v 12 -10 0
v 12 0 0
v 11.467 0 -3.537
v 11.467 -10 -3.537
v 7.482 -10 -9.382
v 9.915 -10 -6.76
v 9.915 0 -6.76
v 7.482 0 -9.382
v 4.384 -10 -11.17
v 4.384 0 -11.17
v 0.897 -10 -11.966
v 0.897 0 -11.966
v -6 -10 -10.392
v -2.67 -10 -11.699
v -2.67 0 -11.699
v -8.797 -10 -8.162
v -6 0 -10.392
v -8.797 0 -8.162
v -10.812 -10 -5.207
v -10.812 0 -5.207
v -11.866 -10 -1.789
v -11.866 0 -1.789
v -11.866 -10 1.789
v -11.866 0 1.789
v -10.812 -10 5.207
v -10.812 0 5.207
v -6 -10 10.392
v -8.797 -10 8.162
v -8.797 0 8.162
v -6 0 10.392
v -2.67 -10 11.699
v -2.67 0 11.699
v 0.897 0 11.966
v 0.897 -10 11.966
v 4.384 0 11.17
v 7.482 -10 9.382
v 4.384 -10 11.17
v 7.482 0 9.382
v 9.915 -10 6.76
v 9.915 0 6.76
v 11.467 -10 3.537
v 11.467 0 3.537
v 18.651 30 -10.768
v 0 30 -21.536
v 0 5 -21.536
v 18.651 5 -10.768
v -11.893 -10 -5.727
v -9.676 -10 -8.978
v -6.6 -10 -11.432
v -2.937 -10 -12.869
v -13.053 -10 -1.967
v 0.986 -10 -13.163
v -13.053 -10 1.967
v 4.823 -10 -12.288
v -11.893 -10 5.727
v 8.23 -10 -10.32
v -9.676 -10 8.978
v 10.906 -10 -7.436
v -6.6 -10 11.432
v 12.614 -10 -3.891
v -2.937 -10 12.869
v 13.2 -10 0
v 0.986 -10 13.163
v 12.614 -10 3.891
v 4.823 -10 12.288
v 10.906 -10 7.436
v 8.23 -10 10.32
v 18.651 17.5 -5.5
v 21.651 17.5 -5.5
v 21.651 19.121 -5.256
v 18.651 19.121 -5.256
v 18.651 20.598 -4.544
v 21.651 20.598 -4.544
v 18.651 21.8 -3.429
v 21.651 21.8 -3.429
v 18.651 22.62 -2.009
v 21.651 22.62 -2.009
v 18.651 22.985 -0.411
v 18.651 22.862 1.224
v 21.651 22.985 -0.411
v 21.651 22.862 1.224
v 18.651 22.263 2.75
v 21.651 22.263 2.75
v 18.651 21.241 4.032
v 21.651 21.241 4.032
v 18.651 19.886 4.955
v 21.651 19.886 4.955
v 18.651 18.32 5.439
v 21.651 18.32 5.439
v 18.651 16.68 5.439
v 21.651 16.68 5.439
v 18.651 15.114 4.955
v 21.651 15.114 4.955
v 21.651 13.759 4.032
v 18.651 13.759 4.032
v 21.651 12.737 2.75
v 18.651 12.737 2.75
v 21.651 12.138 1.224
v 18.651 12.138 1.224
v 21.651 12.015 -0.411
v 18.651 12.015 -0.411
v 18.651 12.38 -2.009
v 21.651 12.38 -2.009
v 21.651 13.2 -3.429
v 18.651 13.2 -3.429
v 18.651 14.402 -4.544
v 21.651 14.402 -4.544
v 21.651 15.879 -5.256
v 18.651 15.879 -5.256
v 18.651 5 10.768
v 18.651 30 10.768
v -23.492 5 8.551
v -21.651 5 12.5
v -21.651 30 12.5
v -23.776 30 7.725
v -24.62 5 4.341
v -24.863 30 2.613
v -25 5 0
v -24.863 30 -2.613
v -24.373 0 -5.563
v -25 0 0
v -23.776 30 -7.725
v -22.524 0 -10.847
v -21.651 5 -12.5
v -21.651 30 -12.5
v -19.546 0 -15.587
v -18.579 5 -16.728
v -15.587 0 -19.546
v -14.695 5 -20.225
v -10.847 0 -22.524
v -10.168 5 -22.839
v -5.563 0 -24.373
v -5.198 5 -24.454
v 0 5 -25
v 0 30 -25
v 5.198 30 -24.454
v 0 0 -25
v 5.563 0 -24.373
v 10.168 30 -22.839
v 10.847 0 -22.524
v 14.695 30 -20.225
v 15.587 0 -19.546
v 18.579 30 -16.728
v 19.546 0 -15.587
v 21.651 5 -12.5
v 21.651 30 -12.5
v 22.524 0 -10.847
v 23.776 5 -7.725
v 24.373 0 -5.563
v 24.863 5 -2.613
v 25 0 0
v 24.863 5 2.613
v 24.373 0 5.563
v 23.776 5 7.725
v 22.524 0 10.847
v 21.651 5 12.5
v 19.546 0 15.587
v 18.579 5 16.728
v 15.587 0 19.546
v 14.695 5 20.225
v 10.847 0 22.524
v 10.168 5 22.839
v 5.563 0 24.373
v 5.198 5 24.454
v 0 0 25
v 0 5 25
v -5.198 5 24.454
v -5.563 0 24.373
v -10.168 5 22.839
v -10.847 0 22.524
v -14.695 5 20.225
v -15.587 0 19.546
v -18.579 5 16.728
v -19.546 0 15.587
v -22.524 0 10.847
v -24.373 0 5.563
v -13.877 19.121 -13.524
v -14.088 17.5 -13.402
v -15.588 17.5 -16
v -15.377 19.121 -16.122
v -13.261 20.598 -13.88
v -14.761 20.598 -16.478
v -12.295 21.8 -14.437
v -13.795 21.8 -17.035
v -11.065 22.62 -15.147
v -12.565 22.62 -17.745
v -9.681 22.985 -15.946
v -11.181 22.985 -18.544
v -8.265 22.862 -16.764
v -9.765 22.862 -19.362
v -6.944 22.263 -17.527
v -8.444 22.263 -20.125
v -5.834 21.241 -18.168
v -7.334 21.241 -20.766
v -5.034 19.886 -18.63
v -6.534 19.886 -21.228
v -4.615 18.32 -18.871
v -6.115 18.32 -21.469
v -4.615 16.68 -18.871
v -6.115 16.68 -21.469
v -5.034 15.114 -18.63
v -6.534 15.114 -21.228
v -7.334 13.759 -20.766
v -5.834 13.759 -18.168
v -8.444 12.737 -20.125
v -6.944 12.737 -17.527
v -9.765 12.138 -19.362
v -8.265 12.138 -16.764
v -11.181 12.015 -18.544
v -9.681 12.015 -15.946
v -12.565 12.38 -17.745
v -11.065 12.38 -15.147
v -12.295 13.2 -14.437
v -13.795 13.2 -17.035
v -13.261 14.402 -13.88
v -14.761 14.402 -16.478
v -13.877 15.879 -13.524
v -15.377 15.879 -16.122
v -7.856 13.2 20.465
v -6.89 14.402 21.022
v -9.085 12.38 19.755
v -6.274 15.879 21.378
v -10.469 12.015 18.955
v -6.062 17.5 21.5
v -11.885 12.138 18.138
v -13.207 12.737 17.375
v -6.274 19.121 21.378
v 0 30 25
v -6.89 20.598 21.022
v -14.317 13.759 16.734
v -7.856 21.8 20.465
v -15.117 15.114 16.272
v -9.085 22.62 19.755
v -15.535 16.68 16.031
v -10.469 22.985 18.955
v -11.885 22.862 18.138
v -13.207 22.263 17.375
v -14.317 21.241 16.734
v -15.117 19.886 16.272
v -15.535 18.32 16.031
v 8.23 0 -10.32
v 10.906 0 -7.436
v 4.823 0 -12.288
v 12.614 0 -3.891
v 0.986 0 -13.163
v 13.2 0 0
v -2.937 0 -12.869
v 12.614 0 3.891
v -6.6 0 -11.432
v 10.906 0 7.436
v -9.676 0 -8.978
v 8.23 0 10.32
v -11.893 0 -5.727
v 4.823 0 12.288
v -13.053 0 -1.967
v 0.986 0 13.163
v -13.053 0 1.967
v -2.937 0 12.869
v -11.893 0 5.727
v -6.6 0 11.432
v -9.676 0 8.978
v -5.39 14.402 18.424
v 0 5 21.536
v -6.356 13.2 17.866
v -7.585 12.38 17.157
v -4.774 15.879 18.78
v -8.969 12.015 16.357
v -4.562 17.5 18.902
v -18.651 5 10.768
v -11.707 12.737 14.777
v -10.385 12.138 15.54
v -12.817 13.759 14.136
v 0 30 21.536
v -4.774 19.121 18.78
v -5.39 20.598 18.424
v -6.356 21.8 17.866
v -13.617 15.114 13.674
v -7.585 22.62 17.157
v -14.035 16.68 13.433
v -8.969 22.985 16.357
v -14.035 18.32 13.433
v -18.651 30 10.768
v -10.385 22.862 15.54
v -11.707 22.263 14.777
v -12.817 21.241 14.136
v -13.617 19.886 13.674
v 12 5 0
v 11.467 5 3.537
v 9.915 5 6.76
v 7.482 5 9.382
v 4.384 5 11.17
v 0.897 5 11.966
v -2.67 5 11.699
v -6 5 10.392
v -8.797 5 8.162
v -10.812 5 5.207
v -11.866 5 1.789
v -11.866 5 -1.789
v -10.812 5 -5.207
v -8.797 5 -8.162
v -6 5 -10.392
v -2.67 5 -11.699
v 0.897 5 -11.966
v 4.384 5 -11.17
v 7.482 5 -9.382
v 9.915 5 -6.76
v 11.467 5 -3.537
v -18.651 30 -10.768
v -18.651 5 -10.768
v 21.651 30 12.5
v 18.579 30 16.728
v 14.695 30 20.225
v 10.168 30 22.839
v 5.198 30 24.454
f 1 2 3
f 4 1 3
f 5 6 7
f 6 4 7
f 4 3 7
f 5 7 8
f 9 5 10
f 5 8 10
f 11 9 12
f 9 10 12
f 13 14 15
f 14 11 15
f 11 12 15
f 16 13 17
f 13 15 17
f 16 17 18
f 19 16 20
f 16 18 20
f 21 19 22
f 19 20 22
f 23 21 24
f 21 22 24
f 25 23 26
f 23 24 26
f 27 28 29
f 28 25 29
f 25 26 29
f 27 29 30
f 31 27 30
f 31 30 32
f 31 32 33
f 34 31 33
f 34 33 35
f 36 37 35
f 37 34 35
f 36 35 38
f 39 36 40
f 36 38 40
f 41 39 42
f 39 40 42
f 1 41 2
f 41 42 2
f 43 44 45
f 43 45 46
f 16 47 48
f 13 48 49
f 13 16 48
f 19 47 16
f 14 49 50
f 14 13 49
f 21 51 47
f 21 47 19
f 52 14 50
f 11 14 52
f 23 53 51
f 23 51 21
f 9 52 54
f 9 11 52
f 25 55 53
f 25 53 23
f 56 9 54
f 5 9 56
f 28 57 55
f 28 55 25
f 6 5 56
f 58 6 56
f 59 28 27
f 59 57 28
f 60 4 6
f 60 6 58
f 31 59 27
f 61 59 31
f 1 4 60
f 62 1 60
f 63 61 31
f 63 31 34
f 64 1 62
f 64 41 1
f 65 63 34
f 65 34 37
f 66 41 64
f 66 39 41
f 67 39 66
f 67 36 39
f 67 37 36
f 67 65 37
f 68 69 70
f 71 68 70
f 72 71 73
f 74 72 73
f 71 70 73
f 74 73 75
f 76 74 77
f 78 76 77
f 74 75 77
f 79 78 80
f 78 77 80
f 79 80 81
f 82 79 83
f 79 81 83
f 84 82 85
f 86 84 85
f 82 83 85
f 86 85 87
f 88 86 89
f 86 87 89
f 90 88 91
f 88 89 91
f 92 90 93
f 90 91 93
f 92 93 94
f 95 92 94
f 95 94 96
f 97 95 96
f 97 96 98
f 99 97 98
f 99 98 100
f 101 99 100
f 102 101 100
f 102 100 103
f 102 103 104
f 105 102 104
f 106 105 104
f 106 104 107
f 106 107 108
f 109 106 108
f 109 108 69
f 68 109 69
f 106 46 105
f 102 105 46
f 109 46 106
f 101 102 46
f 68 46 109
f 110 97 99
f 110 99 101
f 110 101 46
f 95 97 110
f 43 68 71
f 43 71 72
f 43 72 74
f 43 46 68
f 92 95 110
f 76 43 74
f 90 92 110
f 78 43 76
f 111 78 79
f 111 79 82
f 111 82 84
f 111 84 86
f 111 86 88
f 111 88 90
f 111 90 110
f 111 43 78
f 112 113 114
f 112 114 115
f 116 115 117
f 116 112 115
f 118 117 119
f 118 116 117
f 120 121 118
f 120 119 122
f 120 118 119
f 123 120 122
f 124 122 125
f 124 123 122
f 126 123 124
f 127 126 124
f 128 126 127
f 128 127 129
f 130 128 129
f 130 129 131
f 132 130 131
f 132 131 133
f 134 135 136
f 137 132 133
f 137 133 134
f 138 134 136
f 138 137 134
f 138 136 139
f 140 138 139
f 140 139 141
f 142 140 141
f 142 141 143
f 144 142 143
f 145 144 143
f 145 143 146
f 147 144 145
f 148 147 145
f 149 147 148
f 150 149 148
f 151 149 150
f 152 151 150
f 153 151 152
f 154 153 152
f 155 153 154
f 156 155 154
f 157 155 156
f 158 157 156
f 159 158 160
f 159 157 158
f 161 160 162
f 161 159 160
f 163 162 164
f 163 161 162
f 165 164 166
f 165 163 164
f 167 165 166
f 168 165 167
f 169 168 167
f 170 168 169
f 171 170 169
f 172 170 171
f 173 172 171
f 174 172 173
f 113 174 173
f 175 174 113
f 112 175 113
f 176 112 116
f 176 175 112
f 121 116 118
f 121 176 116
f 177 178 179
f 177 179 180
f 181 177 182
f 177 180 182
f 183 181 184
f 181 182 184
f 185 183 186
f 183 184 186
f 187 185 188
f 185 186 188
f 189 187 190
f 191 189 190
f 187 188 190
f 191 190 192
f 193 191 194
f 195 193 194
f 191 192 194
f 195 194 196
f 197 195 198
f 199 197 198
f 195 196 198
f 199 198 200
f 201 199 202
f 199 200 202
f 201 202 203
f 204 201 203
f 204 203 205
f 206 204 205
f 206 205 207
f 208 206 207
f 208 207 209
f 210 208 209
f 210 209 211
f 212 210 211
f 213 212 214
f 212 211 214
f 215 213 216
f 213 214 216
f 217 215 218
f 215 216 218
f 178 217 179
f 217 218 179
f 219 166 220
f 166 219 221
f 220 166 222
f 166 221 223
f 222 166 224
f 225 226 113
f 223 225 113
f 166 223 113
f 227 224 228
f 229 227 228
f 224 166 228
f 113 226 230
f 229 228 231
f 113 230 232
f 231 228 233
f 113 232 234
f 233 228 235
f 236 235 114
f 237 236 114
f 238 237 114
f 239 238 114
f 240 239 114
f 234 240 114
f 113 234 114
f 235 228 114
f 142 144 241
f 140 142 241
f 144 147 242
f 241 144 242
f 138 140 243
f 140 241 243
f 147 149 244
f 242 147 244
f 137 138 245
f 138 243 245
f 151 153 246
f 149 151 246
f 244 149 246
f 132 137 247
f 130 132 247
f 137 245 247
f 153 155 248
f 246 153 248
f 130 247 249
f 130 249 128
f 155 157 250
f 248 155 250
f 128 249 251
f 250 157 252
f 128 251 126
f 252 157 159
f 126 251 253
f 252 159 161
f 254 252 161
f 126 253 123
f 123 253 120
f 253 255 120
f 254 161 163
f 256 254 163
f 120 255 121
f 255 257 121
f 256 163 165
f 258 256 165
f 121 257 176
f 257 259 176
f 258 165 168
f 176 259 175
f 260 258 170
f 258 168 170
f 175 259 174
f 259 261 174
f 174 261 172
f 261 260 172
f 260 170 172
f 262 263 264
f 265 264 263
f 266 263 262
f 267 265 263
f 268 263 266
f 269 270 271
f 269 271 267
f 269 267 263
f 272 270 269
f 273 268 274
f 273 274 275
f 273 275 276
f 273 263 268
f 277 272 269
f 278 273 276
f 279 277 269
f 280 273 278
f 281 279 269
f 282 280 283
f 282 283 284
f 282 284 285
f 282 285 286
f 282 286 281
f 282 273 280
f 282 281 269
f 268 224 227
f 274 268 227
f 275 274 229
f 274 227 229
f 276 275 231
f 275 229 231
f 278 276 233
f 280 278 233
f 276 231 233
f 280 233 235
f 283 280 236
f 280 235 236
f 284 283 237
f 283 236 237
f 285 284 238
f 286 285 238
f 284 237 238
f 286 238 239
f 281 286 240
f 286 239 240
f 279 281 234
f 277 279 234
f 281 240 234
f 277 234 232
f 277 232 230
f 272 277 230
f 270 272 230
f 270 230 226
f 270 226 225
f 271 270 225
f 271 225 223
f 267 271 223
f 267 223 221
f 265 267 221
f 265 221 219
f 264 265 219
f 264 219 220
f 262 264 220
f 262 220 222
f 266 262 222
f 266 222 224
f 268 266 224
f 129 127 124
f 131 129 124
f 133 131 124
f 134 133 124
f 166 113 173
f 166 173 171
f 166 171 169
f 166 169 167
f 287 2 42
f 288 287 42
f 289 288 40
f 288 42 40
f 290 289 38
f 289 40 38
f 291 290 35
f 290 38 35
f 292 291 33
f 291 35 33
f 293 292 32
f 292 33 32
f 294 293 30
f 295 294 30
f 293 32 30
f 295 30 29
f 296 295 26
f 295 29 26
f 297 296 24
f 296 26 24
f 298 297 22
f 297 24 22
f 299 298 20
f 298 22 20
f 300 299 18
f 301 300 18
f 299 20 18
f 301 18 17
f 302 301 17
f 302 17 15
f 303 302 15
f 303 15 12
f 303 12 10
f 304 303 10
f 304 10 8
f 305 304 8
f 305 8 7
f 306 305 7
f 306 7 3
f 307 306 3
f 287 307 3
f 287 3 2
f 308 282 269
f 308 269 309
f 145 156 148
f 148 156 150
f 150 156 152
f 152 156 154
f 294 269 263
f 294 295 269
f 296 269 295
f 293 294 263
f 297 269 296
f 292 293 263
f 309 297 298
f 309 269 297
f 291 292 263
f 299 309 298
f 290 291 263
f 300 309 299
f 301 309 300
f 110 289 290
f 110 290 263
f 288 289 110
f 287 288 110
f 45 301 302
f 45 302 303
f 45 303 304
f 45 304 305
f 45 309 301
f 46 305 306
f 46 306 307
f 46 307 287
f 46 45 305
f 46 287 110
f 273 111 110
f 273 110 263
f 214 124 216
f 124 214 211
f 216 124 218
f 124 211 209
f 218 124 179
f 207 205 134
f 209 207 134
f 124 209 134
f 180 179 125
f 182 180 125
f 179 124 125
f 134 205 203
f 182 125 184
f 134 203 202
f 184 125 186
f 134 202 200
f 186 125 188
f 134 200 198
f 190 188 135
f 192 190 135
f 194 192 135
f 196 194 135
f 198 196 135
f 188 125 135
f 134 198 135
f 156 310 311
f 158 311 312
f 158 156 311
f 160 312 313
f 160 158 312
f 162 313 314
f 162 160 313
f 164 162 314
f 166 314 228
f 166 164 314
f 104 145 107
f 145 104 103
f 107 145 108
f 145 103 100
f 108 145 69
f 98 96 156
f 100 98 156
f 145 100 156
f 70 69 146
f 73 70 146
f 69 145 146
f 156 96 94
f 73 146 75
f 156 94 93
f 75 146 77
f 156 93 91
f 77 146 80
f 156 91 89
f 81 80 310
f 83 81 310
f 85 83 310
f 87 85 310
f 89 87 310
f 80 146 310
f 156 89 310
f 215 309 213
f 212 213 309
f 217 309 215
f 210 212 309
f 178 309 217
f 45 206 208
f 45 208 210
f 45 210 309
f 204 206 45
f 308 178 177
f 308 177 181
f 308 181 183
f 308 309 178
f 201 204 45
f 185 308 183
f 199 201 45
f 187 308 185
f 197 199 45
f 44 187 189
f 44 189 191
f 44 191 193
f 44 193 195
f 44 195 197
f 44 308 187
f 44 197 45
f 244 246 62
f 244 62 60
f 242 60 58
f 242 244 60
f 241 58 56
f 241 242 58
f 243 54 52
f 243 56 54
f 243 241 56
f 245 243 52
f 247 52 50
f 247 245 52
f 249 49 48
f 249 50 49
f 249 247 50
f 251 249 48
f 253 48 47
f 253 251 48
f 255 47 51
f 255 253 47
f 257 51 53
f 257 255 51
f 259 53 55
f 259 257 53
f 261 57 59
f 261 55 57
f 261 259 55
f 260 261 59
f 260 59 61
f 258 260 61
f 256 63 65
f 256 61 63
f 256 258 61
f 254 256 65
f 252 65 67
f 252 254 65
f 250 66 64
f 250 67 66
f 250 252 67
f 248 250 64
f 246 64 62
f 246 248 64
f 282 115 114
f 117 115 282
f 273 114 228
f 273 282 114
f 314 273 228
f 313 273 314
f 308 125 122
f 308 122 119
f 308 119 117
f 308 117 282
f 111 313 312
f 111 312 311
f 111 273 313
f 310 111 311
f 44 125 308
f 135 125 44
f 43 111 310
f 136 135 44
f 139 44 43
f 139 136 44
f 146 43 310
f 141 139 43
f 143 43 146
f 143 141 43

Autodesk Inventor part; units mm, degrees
ref_plane "YZ Plane" through (0, 0, 0) normal (1, 0, 0) x (0, 1, 0)
ref_plane "XZ Plane" through (0, 0, 0) normal (0, 1, 0) x (-1, 0, 0)
ref_plane "XY Plane" through (0, 0, 0) normal (0, 0, 1) x (1, 0, 0)
sketch "Sketch1" plane through (0, 0, 0) normal (0, 1, 0) x (-1, 0, 0)
  circle A0 centre (0, 0) radius 25
  dimension "d0" = 50
extrude "Extrusion1" add sketch "Sketch1" along normal blind 5
sketch "Sketch2" plane through (0, 5, 0) normal (0, 1, 0) x (1, 0, 0)
  circle A0 centre (0, 0) radius 25
extrude "Extrusion2" add sketch "Sketch2" along normal blind 25
sketch "Sketch3" plane through (0, 30, 0) normal (0, 1, 0) x (1, 0, 0)
  circle A0 centre (0, 0) radius 25 projected
  line L0 (0, 25) -> (21.6506, 12.5)
  line L1 (21.6506, 12.5) -> (21.6506, -12.5)
  line L2 (21.6506, -12.5) -> (0, -25)
  line L3 (0, -25) -> (-21.6506, -12.5)
  line L4 (-21.6506, -12.5) -> (-21.6506, 12.5)
  line L5 (-21.6506, 12.5) -> (0, 25)
  point P0 (0, -25)
extrude "Extrusion3" cut sketch "Sketch3" against normal blind 25 contours A0 L1 | L5 A0 | A0 L3
sketch "Sketch4" plane through (0, 30, 0) normal (0, 1, 0) x (1, 0, 0)
  arc A0 (-21.6506, 12.5) -> (-21.6506, -12.5) centre (0, 0) ccw projected
  line L0 (-21.6506, 12.5) -> (0, 25)
  line L1 (0, 25) -> (21.6506, 12.5)
  line L2 (21.6506, 12.5) -> (21.6506, -12.5)
  line L3 (21.6506, -12.5) -> (0, -25)
  line L4 (0, -25) -> (-21.6506, -12.5)
  line L5 (-21.6506, -12.5) -> (-21.6506, 12.5)
  circle A1 centre (0, 0) radius 25 projected
  line L6 (-18.6506, 10.7679) -> (0, 21.5359)
  line L7 (0, 21.5359) -> (18.6506, 10.7679)
  line L8 (18.6506, 10.7679) -> (18.6506, -10.7679)
  line L9 (18.6506, -10.7679) -> (0, -21.5359)
  line L10 (0, -21.5359) -> (-18.6506, -10.7679)
  line L11 (-18.6506, -10.7679) -> (-18.6506, 10.7679)
  dimension "d7" = 3
extrude "Extrusion4" cut sketch "Sketch4" against normal blind 25 contours L6 L7 L8 L9 L10 L11
sketch "Sketch5" plane through (0, 5, -25) normal (-0.5, 0, -0.8660254) x (-0.8660254, 0, 0.5)
  circle A0 centre (12.5, 12.5) radius 5.5
  line L0 (0, 0) -> (0, 25) projected
  line L1 (0, 0) -> (25, 0) projected
  line L2 (0, 25) -> (25, 25) projected
  line L3 (25, 25) -> (25, 0) projected
  point P0 (12.5, -5)
  point P1 (25, 12.5)
  dimension "d10" = 11
  dimension "d11" = 12.5
  dimension "d12" = 12.5
  dimension "d13" = 12.5
  dimension "d14" = 12.5
extrude "Extrusion5" cut sketch "Sketch5" against normal blind 25 contours A0
pattern_circular "Circular Pattern1" count 3 over 360 about axis through (0, 0, 0) along (0, 1, 0) of "Extrusion5"
sketch "Sketch6" plane through (0, 0, 0) normal (0, -1, 0) x (1, 0, 0)
  circle A0 centre (0, 0) radius 12
  circle A1 centre (0, 0) radius 13.2
  dimension "d20" = 24
  dimension "d21" = 26.4
extrude "Extrusion6" add sketch "Sketch6" along normal blind 10
sketch "Sketch7" plane through (0, 0, 0) normal (0, -1, 0) x (1, 0, 0)
  circle A0 centre (0, 0) radius 12 projected
extrude "Extrusion7" cut sketch "Sketch7" against normal blind 10
properties part number "spojkaV2"
